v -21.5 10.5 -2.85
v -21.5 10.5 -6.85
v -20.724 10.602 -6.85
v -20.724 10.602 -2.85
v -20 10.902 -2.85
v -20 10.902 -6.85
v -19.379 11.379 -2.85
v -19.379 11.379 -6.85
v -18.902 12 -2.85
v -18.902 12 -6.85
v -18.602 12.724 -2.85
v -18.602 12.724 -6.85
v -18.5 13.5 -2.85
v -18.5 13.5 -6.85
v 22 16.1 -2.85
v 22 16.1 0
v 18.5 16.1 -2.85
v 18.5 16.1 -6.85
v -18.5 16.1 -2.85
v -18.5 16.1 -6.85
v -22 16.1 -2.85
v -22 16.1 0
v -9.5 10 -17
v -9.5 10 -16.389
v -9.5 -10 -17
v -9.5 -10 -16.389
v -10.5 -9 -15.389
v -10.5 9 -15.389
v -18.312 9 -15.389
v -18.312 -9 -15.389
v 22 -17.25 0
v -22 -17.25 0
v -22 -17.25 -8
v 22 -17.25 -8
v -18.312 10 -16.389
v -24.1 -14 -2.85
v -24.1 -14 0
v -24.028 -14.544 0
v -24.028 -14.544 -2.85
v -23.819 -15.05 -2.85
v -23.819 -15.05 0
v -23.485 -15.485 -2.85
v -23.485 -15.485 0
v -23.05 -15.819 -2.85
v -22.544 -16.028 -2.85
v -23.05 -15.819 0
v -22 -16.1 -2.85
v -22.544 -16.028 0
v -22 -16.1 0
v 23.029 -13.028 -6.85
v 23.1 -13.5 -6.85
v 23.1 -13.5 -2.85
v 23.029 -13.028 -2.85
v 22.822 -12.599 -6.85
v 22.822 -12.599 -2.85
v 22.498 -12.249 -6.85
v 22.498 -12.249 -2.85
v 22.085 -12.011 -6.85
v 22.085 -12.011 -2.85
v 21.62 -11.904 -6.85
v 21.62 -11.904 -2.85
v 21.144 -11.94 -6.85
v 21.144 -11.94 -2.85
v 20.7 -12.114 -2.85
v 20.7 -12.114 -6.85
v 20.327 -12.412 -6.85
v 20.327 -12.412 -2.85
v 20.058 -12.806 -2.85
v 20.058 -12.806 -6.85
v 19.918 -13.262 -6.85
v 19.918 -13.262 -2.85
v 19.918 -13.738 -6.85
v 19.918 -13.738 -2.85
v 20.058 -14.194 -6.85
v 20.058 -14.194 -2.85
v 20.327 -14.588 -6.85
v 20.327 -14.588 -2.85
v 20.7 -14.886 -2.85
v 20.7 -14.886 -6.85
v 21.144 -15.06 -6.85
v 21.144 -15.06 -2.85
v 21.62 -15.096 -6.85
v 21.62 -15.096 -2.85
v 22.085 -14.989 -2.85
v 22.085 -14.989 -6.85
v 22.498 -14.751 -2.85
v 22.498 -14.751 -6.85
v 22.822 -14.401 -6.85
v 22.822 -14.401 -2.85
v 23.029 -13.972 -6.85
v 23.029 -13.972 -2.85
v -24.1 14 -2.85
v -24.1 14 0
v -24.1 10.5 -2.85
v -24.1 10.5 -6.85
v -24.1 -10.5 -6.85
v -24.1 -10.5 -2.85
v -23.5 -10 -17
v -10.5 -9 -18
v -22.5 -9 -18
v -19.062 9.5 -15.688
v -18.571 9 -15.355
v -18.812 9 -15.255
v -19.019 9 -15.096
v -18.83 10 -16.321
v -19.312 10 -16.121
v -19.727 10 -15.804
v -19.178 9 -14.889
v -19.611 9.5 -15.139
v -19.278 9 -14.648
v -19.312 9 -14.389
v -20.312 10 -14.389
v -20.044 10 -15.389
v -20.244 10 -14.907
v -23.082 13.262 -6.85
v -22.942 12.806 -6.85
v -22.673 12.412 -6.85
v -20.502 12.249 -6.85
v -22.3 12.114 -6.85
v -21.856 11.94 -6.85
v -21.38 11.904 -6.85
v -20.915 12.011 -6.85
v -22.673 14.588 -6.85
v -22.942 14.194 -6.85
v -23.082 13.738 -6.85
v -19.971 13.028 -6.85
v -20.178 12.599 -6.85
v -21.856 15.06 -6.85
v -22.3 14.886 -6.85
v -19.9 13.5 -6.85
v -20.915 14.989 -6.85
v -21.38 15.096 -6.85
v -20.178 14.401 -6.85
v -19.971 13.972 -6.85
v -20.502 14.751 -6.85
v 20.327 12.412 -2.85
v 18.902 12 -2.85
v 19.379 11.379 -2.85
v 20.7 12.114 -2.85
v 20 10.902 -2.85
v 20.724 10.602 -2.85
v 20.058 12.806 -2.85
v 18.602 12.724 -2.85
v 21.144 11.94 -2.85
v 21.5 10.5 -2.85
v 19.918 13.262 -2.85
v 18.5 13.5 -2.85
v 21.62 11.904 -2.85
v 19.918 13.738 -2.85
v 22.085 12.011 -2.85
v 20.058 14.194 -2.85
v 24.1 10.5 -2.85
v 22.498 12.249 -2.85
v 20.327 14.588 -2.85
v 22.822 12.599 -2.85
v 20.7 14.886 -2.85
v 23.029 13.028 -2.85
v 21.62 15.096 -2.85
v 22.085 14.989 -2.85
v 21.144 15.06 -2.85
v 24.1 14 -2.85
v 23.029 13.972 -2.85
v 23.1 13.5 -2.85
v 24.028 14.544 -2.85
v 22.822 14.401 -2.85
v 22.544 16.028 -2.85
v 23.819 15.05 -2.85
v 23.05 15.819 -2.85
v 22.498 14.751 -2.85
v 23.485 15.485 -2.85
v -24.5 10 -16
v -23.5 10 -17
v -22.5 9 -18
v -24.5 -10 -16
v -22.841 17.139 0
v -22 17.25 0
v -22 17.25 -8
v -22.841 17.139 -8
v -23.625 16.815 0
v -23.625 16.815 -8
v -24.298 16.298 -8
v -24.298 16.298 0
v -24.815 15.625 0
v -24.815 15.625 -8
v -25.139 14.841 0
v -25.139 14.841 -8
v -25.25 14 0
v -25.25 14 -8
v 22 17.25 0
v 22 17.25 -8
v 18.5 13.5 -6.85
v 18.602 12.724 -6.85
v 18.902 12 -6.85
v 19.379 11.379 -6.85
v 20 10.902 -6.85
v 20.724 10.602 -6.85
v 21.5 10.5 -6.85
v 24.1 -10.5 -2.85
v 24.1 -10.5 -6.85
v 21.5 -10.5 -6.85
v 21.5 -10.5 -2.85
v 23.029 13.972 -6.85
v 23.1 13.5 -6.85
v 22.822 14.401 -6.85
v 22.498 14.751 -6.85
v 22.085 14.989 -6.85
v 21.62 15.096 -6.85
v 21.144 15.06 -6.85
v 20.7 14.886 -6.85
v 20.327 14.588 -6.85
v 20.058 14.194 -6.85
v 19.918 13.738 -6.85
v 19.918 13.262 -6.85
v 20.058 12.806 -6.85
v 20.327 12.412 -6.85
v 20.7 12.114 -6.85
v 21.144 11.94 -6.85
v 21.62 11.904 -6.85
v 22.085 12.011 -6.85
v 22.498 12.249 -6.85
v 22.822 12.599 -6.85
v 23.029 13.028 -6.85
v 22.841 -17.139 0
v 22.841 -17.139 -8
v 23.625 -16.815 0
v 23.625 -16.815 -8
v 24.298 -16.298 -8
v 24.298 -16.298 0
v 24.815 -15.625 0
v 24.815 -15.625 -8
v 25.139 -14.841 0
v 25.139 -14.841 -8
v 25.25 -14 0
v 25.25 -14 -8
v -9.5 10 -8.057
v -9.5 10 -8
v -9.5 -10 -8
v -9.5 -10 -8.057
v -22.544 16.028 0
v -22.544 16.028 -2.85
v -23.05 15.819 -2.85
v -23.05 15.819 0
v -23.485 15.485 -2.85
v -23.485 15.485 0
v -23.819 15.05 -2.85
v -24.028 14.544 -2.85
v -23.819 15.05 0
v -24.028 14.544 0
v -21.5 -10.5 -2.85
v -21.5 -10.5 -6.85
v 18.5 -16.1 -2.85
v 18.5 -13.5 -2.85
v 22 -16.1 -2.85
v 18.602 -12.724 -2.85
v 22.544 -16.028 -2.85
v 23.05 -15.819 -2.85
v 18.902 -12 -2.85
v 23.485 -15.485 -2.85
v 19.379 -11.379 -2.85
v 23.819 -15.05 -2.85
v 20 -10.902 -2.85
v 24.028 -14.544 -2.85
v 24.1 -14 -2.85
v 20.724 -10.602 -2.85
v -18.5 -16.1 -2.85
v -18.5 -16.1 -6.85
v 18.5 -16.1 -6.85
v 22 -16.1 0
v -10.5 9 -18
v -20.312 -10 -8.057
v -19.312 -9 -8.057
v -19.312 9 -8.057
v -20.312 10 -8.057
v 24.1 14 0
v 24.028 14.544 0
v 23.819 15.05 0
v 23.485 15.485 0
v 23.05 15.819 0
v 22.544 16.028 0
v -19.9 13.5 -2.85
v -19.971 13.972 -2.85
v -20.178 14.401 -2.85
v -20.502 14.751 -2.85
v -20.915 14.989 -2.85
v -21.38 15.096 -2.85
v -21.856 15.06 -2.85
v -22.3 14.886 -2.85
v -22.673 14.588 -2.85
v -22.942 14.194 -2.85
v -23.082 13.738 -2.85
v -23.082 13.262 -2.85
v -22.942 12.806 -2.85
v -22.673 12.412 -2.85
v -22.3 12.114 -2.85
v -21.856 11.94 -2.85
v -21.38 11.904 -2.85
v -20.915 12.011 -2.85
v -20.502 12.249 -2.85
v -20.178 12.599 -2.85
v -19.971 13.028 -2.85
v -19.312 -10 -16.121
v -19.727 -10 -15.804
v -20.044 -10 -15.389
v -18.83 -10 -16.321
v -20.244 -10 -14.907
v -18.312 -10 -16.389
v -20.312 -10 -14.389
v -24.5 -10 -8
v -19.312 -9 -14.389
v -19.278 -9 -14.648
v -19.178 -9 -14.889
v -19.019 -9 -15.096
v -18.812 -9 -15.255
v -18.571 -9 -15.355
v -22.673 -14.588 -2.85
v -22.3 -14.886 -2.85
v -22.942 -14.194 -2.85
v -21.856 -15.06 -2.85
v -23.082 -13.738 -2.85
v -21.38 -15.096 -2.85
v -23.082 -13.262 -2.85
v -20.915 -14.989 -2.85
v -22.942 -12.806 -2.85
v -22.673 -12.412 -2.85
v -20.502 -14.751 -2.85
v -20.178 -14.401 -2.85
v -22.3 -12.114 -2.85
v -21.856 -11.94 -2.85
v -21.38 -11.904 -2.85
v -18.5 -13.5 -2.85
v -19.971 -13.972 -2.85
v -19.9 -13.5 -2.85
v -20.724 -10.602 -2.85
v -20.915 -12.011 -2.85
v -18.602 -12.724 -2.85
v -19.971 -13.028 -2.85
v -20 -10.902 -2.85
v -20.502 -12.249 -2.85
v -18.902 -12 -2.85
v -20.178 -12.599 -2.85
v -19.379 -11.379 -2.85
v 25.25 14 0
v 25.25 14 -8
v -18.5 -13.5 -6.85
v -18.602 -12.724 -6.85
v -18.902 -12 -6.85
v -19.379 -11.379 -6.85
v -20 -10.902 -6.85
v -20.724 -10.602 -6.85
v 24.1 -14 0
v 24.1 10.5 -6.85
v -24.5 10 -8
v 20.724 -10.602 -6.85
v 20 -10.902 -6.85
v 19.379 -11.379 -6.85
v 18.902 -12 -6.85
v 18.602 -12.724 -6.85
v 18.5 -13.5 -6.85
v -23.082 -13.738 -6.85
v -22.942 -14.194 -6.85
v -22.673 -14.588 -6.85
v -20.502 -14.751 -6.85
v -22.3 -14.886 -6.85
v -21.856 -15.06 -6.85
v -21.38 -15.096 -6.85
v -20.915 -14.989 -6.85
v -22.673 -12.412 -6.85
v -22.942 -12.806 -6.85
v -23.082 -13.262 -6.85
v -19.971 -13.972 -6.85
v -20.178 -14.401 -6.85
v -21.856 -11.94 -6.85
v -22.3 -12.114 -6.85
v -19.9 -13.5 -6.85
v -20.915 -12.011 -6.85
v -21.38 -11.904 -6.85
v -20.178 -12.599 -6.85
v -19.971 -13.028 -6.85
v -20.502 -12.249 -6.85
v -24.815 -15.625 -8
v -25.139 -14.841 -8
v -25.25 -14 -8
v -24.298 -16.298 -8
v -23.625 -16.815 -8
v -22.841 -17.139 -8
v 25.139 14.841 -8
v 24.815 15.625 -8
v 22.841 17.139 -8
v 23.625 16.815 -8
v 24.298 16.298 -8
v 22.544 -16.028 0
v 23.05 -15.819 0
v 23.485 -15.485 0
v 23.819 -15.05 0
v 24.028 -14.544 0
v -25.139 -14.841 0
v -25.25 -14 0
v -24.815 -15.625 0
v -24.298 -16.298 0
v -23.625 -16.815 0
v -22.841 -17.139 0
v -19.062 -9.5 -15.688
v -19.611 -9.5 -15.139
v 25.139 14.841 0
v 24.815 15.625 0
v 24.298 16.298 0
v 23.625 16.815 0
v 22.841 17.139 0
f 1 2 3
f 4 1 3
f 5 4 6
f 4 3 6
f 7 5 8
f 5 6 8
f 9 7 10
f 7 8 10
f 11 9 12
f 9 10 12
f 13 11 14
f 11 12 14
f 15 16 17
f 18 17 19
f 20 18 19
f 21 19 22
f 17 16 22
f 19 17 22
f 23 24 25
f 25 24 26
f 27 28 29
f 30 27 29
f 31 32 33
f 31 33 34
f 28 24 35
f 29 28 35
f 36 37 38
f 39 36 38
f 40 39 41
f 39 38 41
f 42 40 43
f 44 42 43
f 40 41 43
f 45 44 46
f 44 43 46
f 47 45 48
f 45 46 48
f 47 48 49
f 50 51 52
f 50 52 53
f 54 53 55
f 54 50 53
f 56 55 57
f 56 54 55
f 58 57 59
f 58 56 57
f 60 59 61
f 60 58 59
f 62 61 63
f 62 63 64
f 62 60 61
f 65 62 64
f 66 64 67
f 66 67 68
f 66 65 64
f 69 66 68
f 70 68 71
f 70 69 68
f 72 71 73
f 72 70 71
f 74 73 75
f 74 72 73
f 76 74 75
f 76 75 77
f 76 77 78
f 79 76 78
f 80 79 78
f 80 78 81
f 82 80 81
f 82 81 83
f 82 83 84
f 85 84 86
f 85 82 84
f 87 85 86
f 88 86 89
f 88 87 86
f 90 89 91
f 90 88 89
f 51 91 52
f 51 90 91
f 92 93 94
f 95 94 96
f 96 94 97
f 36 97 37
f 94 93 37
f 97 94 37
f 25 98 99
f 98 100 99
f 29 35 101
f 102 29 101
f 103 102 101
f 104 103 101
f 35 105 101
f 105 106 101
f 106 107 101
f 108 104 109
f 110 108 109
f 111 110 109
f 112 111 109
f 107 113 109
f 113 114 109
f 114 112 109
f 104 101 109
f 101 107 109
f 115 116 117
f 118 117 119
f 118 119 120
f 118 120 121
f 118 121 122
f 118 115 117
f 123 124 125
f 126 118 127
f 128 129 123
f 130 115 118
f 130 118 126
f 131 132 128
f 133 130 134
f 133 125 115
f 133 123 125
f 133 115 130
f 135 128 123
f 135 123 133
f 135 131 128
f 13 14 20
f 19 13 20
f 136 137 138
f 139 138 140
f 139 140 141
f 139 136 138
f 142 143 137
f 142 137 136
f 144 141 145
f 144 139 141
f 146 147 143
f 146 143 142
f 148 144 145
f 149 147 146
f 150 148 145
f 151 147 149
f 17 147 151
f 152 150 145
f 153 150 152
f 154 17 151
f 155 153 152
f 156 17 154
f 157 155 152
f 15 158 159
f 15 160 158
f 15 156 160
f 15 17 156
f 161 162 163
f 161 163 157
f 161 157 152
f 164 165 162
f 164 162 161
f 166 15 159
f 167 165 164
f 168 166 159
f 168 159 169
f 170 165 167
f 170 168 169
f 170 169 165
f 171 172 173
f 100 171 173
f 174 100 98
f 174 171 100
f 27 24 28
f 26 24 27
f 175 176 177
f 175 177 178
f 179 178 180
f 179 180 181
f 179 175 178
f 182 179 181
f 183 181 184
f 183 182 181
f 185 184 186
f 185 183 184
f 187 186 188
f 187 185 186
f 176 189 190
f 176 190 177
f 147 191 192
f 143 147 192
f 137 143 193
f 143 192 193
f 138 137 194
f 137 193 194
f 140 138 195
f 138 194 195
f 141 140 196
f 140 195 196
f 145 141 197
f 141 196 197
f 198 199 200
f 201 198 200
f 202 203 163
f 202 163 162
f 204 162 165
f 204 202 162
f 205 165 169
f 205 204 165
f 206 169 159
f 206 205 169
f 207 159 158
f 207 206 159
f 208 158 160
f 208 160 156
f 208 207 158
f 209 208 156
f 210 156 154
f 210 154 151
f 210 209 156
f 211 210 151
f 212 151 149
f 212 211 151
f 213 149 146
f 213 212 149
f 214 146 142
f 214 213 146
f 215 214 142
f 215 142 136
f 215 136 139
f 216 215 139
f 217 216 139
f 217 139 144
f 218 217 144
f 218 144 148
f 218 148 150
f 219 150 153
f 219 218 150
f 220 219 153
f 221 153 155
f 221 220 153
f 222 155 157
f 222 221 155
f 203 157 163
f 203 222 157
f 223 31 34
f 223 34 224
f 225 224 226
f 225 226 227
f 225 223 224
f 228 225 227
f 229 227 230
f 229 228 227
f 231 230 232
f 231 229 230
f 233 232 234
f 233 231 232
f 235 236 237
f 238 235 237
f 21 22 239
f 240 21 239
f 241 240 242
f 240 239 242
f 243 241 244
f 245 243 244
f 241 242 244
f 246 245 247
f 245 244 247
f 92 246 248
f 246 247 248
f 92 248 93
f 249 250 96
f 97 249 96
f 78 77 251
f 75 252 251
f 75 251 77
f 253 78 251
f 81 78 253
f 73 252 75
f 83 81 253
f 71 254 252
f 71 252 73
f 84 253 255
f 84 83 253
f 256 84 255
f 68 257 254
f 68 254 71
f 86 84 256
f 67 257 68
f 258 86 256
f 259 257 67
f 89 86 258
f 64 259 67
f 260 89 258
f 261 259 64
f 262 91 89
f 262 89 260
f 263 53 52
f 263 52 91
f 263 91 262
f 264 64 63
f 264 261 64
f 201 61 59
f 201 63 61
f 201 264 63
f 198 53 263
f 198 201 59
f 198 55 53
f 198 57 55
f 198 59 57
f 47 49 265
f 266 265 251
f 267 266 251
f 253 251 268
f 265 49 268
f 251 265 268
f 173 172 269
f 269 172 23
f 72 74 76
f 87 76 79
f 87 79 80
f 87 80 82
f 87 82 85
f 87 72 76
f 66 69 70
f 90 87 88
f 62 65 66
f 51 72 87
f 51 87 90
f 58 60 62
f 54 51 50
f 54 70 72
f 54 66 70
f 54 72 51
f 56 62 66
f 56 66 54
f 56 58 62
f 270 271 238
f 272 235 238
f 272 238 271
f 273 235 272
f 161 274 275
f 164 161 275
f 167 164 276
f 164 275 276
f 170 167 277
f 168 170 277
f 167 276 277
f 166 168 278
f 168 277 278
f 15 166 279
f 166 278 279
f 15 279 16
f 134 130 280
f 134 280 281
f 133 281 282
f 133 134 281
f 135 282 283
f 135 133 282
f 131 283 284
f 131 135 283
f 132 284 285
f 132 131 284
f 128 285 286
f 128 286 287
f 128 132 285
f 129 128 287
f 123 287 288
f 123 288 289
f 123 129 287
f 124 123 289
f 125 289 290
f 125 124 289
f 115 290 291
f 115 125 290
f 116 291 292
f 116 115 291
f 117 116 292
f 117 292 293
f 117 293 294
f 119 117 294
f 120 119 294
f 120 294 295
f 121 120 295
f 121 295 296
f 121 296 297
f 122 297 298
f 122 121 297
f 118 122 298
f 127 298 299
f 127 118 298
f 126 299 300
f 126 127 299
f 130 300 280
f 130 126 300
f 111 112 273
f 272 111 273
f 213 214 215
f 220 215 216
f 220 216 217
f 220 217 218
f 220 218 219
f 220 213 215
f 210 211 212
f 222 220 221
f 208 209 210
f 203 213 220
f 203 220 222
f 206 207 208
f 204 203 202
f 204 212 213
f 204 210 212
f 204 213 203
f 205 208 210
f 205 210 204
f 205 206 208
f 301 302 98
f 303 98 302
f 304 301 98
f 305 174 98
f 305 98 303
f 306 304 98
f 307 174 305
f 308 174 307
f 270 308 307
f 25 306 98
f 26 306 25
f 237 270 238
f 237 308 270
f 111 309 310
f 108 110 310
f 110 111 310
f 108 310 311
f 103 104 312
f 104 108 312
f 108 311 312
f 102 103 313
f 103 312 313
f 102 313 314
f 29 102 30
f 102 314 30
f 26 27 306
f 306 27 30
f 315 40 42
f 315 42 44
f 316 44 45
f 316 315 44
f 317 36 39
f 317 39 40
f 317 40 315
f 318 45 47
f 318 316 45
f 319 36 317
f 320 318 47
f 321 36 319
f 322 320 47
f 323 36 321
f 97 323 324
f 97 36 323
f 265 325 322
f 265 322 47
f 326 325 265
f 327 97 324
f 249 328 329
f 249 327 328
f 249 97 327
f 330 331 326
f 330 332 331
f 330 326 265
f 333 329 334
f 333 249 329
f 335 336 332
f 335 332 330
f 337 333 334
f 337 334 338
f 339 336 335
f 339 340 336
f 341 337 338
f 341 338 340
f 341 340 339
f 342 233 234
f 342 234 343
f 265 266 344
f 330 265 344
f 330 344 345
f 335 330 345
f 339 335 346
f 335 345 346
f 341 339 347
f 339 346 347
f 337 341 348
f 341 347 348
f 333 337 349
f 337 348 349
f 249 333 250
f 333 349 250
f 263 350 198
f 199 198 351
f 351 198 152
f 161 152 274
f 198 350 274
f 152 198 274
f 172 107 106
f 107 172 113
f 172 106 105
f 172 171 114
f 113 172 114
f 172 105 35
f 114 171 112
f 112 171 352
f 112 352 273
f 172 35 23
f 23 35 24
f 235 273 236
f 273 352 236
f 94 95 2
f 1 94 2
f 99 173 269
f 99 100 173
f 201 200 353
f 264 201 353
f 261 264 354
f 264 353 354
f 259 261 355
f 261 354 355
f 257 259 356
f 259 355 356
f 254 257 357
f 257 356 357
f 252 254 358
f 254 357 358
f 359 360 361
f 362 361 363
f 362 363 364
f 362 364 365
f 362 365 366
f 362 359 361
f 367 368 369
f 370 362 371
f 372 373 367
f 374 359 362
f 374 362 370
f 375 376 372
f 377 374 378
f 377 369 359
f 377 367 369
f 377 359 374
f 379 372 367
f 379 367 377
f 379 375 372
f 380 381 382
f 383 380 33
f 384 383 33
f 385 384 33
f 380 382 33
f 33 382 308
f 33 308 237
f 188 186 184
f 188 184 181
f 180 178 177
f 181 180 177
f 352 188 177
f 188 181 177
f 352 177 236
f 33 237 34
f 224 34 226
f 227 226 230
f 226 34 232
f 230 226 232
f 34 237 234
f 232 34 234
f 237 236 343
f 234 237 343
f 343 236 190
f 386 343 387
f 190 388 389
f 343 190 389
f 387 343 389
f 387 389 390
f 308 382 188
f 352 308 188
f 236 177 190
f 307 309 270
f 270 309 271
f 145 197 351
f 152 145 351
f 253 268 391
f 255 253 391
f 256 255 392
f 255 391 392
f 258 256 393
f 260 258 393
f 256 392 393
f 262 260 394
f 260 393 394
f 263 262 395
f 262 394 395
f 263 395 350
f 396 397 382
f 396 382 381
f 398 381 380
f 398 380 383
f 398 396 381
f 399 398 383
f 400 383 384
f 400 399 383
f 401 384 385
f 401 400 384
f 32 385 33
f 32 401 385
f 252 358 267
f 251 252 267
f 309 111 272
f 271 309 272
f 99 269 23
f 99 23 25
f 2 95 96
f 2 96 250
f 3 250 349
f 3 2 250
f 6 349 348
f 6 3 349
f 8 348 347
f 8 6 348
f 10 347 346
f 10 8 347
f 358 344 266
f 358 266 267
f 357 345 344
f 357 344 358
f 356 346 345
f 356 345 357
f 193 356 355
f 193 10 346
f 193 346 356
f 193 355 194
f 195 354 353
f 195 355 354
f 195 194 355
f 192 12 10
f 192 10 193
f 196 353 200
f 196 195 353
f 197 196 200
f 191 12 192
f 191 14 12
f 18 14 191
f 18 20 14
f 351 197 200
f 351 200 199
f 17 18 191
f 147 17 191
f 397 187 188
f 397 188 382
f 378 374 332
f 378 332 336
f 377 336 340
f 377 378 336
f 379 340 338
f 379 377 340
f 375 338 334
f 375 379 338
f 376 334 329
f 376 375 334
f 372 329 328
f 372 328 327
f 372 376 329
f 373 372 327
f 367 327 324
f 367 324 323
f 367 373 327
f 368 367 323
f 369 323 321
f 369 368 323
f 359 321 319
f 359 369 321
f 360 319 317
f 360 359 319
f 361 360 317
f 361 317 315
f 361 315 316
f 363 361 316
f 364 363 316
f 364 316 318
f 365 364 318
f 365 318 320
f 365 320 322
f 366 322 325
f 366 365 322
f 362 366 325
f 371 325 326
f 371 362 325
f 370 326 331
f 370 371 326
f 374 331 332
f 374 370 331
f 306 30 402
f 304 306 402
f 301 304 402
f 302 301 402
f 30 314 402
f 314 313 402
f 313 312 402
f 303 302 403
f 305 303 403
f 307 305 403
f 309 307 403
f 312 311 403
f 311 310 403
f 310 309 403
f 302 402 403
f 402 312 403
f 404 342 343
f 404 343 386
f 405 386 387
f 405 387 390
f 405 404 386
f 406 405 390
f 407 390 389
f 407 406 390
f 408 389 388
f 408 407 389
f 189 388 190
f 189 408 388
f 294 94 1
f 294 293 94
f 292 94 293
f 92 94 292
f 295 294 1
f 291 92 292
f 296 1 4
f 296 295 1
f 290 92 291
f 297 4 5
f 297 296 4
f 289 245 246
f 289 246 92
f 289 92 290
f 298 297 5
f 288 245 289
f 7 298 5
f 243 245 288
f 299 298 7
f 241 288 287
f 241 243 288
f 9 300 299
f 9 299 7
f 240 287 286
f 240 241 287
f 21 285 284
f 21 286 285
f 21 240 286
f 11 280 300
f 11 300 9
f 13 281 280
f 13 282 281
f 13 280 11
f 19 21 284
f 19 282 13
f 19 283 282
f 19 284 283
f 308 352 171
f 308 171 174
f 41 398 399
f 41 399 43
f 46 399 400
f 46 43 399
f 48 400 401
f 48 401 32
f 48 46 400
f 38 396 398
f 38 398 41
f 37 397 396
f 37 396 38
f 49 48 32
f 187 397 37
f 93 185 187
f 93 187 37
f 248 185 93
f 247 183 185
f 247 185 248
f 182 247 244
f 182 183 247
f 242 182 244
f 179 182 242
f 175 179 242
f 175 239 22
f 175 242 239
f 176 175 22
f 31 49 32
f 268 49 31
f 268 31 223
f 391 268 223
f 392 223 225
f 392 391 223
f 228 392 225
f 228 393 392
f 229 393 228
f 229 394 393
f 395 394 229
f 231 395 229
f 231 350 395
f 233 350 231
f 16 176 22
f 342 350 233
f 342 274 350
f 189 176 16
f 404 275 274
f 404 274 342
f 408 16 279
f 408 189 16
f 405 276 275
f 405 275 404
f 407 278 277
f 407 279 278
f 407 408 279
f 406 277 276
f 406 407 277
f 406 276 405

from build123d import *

# Parameters (mm, degrees)
PAD_DEPTH       = 8
THICKNESS_T     = -1.15
SKETCH002_R     = 1.6
PAD008_DEPTH    = 4
SKETCH011_W     = 15
SKETCH011_H     = 20
PAD009_DEPTH    = 10
SKETCH012_W     = 9.970298
SKETCH012_H     = 7.33189
POCKET002_DEPTH = 20
FILLET002_R     = 1
CHAMFER_SIZE    = 1
CHAMFER001_SIZE = 2


with BuildPart() as part:
    # Sketch001 → Pad (new body)
    with BuildSketch(Plane.XY):
        with BuildLine():
            Line((-25.25, 14), (-25.25, -14))
            ThreePointArc((-25.25, -14), (-24.298097, -16.298097), (-22, -17.25))
            Line((-22, -17.25), (22, -17.25))
            ThreePointArc((22, -17.25), (24.298097, -16.298097), (25.25, -14))
            Line((25.25, -14), (25.25, 14))
            ThreePointArc((25.25, 14), (24.298097, 16.298097), (22, 17.25))
            Line((22, 17.25), (-22, 17.25))
            ThreePointArc((-22, 17.25), (-24.298097, 16.298097), (-25.25, 14))
        make_face()
    extrude(amount=-PAD_DEPTH)

    # Thickness
    thickness_openings = [part.faces().sort_by_distance(p)[0] for p in [
        (0, 0, 0),
    ]]
    offset(amount=THICKNESS_T, openings=thickness_openings)

    # Sketch002 (on Face19 of Thickness) → Pad008 (join)
    with BuildSketch(Plane.XY.offset(-6.85)):
        with BuildLine():
            Line((-24.1, 14), (-24.1, 10.5))
            Line((-24.1, 10.5), (-21.5, 10.5))
            ThreePointArc((-21.5, 10.5), (-19.37868, 11.37868), (-18.5, 13.5))
            Line((-18.5, 13.5), (-18.5, 16.1))
            Line((-18.5, 16.1), (-22, 16.1))
            ThreePointArc((-22, 16.1), (-23.484924, 15.484924), (-24.1, 14))
        make_face()
        with Locations((-21.5, 13.5)):
            Circle(SKETCH002_R, mode=Mode.SUBTRACT)
        with BuildLine():
            Line((18.5, 16.1), (18.5, 13.5))
            ThreePointArc((18.5, 13.5), (19.37868, 11.37868), (21.5, 10.5))
            Line((21.5, 10.5), (24.1, 10.5))
            Line((24.1, 10.5), (24.1, 14))
            ThreePointArc((24.1, 14), (23.484924, 15.484924), (22, 16.1))
            Line((22, 16.1), (18.5, 16.1))
        make_face()
        with Locations((21.5, 13.5)):
            Circle(SKETCH002_R, mode=Mode.SUBTRACT)
        with BuildLine():
            Line((-21.5, -10.5), (-24.1, -10.5))
            Line((-24.1, -10.5), (-24.1, -14))
            ThreePointArc((-24.1, -14), (-23.484924, -15.484924), (-22, -16.1))
            Line((-22, -16.1), (-18.5, -16.1))
            Line((-18.5, -16.1), (-18.5, -13.5))
            ThreePointArc((-18.5, -13.5), (-19.37868, -11.37868), (-21.5, -10.5))
        make_face()
        with Locations((-21.5, -13.5)):
            Circle(SKETCH002_R, mode=Mode.SUBTRACT)
        with BuildLine():
            Line((18.5, -13.5), (18.5, -16.1))
            Line((18.5, -16.1), (22, -16.1))
            ThreePointArc((22, -16.1), (23.484924, -15.484924), (24.1, -14))
            Line((24.1, -14), (24.1, -10.5))
            Line((24.1, -10.5), (21.5, -10.5))
            ThreePointArc((21.5, -10.5), (19.37868, -11.37868), (18.5, -13.5))
        make_face()
        with Locations((21.5, -13.5)):
            Circle(SKETCH002_R, mode=Mode.SUBTRACT)
    extrude(amount=PAD008_DEPTH)

    # Sketch011 (on Face5 of Pad008) → Pad009 (join)
    with BuildSketch(Plane(origin=(0, 0, -8), x_dir=(1, 0, 0), z_dir=(0, 0, -1))):
        with Locations((-17, 0)):
            Rectangle(SKETCH011_W, SKETCH011_H)
    extrude(amount=PAD009_DEPTH)

    # Sketch012 (on Face19 of Pad009) → Pocket002 (cut)
    with BuildSketch(Plane(origin=(0, 10, 0), x_dir=(-1, 0, 0), z_dir=(0, 1, 0))):
        with Locations((14.327169, -11.723372)):
            Rectangle(SKETCH012_W, SKETCH012_H)
    extrude(amount=-POCKET002_DEPTH, mode=Mode.SUBTRACT)

    # Fillet002
    fillet002_edges = [part.edges().sort_by_distance(p)[0] for p in [
        (-19.312318, 0, -15.389317),
    ]]
    fillet(fillet002_edges, radius=FILLET002_R)

    # Chamfer
    chamfer_edges = [part.edges().sort_by_distance(p)[0] for p in [
        (-17, 10, -18),
        (-13.906159, 10, -15.389317),
        (-9.5, 0, -18),
        (-9.5, 0, -15.389317),
        (-13.906159, -10, -15.389317),
        (-17, -10, -18),
    ]]
    chamfer(chamfer_edges, length=CHAMFER_SIZE)

    # Chamfer001
    chamfer001_edges = [part.edges().sort_by_distance(p)[0] for p in [
        (-24.5, 0, -18),
    ]]
    chamfer(chamfer001_edges, length=CHAMFER001_SIZE)


solid = part.part
